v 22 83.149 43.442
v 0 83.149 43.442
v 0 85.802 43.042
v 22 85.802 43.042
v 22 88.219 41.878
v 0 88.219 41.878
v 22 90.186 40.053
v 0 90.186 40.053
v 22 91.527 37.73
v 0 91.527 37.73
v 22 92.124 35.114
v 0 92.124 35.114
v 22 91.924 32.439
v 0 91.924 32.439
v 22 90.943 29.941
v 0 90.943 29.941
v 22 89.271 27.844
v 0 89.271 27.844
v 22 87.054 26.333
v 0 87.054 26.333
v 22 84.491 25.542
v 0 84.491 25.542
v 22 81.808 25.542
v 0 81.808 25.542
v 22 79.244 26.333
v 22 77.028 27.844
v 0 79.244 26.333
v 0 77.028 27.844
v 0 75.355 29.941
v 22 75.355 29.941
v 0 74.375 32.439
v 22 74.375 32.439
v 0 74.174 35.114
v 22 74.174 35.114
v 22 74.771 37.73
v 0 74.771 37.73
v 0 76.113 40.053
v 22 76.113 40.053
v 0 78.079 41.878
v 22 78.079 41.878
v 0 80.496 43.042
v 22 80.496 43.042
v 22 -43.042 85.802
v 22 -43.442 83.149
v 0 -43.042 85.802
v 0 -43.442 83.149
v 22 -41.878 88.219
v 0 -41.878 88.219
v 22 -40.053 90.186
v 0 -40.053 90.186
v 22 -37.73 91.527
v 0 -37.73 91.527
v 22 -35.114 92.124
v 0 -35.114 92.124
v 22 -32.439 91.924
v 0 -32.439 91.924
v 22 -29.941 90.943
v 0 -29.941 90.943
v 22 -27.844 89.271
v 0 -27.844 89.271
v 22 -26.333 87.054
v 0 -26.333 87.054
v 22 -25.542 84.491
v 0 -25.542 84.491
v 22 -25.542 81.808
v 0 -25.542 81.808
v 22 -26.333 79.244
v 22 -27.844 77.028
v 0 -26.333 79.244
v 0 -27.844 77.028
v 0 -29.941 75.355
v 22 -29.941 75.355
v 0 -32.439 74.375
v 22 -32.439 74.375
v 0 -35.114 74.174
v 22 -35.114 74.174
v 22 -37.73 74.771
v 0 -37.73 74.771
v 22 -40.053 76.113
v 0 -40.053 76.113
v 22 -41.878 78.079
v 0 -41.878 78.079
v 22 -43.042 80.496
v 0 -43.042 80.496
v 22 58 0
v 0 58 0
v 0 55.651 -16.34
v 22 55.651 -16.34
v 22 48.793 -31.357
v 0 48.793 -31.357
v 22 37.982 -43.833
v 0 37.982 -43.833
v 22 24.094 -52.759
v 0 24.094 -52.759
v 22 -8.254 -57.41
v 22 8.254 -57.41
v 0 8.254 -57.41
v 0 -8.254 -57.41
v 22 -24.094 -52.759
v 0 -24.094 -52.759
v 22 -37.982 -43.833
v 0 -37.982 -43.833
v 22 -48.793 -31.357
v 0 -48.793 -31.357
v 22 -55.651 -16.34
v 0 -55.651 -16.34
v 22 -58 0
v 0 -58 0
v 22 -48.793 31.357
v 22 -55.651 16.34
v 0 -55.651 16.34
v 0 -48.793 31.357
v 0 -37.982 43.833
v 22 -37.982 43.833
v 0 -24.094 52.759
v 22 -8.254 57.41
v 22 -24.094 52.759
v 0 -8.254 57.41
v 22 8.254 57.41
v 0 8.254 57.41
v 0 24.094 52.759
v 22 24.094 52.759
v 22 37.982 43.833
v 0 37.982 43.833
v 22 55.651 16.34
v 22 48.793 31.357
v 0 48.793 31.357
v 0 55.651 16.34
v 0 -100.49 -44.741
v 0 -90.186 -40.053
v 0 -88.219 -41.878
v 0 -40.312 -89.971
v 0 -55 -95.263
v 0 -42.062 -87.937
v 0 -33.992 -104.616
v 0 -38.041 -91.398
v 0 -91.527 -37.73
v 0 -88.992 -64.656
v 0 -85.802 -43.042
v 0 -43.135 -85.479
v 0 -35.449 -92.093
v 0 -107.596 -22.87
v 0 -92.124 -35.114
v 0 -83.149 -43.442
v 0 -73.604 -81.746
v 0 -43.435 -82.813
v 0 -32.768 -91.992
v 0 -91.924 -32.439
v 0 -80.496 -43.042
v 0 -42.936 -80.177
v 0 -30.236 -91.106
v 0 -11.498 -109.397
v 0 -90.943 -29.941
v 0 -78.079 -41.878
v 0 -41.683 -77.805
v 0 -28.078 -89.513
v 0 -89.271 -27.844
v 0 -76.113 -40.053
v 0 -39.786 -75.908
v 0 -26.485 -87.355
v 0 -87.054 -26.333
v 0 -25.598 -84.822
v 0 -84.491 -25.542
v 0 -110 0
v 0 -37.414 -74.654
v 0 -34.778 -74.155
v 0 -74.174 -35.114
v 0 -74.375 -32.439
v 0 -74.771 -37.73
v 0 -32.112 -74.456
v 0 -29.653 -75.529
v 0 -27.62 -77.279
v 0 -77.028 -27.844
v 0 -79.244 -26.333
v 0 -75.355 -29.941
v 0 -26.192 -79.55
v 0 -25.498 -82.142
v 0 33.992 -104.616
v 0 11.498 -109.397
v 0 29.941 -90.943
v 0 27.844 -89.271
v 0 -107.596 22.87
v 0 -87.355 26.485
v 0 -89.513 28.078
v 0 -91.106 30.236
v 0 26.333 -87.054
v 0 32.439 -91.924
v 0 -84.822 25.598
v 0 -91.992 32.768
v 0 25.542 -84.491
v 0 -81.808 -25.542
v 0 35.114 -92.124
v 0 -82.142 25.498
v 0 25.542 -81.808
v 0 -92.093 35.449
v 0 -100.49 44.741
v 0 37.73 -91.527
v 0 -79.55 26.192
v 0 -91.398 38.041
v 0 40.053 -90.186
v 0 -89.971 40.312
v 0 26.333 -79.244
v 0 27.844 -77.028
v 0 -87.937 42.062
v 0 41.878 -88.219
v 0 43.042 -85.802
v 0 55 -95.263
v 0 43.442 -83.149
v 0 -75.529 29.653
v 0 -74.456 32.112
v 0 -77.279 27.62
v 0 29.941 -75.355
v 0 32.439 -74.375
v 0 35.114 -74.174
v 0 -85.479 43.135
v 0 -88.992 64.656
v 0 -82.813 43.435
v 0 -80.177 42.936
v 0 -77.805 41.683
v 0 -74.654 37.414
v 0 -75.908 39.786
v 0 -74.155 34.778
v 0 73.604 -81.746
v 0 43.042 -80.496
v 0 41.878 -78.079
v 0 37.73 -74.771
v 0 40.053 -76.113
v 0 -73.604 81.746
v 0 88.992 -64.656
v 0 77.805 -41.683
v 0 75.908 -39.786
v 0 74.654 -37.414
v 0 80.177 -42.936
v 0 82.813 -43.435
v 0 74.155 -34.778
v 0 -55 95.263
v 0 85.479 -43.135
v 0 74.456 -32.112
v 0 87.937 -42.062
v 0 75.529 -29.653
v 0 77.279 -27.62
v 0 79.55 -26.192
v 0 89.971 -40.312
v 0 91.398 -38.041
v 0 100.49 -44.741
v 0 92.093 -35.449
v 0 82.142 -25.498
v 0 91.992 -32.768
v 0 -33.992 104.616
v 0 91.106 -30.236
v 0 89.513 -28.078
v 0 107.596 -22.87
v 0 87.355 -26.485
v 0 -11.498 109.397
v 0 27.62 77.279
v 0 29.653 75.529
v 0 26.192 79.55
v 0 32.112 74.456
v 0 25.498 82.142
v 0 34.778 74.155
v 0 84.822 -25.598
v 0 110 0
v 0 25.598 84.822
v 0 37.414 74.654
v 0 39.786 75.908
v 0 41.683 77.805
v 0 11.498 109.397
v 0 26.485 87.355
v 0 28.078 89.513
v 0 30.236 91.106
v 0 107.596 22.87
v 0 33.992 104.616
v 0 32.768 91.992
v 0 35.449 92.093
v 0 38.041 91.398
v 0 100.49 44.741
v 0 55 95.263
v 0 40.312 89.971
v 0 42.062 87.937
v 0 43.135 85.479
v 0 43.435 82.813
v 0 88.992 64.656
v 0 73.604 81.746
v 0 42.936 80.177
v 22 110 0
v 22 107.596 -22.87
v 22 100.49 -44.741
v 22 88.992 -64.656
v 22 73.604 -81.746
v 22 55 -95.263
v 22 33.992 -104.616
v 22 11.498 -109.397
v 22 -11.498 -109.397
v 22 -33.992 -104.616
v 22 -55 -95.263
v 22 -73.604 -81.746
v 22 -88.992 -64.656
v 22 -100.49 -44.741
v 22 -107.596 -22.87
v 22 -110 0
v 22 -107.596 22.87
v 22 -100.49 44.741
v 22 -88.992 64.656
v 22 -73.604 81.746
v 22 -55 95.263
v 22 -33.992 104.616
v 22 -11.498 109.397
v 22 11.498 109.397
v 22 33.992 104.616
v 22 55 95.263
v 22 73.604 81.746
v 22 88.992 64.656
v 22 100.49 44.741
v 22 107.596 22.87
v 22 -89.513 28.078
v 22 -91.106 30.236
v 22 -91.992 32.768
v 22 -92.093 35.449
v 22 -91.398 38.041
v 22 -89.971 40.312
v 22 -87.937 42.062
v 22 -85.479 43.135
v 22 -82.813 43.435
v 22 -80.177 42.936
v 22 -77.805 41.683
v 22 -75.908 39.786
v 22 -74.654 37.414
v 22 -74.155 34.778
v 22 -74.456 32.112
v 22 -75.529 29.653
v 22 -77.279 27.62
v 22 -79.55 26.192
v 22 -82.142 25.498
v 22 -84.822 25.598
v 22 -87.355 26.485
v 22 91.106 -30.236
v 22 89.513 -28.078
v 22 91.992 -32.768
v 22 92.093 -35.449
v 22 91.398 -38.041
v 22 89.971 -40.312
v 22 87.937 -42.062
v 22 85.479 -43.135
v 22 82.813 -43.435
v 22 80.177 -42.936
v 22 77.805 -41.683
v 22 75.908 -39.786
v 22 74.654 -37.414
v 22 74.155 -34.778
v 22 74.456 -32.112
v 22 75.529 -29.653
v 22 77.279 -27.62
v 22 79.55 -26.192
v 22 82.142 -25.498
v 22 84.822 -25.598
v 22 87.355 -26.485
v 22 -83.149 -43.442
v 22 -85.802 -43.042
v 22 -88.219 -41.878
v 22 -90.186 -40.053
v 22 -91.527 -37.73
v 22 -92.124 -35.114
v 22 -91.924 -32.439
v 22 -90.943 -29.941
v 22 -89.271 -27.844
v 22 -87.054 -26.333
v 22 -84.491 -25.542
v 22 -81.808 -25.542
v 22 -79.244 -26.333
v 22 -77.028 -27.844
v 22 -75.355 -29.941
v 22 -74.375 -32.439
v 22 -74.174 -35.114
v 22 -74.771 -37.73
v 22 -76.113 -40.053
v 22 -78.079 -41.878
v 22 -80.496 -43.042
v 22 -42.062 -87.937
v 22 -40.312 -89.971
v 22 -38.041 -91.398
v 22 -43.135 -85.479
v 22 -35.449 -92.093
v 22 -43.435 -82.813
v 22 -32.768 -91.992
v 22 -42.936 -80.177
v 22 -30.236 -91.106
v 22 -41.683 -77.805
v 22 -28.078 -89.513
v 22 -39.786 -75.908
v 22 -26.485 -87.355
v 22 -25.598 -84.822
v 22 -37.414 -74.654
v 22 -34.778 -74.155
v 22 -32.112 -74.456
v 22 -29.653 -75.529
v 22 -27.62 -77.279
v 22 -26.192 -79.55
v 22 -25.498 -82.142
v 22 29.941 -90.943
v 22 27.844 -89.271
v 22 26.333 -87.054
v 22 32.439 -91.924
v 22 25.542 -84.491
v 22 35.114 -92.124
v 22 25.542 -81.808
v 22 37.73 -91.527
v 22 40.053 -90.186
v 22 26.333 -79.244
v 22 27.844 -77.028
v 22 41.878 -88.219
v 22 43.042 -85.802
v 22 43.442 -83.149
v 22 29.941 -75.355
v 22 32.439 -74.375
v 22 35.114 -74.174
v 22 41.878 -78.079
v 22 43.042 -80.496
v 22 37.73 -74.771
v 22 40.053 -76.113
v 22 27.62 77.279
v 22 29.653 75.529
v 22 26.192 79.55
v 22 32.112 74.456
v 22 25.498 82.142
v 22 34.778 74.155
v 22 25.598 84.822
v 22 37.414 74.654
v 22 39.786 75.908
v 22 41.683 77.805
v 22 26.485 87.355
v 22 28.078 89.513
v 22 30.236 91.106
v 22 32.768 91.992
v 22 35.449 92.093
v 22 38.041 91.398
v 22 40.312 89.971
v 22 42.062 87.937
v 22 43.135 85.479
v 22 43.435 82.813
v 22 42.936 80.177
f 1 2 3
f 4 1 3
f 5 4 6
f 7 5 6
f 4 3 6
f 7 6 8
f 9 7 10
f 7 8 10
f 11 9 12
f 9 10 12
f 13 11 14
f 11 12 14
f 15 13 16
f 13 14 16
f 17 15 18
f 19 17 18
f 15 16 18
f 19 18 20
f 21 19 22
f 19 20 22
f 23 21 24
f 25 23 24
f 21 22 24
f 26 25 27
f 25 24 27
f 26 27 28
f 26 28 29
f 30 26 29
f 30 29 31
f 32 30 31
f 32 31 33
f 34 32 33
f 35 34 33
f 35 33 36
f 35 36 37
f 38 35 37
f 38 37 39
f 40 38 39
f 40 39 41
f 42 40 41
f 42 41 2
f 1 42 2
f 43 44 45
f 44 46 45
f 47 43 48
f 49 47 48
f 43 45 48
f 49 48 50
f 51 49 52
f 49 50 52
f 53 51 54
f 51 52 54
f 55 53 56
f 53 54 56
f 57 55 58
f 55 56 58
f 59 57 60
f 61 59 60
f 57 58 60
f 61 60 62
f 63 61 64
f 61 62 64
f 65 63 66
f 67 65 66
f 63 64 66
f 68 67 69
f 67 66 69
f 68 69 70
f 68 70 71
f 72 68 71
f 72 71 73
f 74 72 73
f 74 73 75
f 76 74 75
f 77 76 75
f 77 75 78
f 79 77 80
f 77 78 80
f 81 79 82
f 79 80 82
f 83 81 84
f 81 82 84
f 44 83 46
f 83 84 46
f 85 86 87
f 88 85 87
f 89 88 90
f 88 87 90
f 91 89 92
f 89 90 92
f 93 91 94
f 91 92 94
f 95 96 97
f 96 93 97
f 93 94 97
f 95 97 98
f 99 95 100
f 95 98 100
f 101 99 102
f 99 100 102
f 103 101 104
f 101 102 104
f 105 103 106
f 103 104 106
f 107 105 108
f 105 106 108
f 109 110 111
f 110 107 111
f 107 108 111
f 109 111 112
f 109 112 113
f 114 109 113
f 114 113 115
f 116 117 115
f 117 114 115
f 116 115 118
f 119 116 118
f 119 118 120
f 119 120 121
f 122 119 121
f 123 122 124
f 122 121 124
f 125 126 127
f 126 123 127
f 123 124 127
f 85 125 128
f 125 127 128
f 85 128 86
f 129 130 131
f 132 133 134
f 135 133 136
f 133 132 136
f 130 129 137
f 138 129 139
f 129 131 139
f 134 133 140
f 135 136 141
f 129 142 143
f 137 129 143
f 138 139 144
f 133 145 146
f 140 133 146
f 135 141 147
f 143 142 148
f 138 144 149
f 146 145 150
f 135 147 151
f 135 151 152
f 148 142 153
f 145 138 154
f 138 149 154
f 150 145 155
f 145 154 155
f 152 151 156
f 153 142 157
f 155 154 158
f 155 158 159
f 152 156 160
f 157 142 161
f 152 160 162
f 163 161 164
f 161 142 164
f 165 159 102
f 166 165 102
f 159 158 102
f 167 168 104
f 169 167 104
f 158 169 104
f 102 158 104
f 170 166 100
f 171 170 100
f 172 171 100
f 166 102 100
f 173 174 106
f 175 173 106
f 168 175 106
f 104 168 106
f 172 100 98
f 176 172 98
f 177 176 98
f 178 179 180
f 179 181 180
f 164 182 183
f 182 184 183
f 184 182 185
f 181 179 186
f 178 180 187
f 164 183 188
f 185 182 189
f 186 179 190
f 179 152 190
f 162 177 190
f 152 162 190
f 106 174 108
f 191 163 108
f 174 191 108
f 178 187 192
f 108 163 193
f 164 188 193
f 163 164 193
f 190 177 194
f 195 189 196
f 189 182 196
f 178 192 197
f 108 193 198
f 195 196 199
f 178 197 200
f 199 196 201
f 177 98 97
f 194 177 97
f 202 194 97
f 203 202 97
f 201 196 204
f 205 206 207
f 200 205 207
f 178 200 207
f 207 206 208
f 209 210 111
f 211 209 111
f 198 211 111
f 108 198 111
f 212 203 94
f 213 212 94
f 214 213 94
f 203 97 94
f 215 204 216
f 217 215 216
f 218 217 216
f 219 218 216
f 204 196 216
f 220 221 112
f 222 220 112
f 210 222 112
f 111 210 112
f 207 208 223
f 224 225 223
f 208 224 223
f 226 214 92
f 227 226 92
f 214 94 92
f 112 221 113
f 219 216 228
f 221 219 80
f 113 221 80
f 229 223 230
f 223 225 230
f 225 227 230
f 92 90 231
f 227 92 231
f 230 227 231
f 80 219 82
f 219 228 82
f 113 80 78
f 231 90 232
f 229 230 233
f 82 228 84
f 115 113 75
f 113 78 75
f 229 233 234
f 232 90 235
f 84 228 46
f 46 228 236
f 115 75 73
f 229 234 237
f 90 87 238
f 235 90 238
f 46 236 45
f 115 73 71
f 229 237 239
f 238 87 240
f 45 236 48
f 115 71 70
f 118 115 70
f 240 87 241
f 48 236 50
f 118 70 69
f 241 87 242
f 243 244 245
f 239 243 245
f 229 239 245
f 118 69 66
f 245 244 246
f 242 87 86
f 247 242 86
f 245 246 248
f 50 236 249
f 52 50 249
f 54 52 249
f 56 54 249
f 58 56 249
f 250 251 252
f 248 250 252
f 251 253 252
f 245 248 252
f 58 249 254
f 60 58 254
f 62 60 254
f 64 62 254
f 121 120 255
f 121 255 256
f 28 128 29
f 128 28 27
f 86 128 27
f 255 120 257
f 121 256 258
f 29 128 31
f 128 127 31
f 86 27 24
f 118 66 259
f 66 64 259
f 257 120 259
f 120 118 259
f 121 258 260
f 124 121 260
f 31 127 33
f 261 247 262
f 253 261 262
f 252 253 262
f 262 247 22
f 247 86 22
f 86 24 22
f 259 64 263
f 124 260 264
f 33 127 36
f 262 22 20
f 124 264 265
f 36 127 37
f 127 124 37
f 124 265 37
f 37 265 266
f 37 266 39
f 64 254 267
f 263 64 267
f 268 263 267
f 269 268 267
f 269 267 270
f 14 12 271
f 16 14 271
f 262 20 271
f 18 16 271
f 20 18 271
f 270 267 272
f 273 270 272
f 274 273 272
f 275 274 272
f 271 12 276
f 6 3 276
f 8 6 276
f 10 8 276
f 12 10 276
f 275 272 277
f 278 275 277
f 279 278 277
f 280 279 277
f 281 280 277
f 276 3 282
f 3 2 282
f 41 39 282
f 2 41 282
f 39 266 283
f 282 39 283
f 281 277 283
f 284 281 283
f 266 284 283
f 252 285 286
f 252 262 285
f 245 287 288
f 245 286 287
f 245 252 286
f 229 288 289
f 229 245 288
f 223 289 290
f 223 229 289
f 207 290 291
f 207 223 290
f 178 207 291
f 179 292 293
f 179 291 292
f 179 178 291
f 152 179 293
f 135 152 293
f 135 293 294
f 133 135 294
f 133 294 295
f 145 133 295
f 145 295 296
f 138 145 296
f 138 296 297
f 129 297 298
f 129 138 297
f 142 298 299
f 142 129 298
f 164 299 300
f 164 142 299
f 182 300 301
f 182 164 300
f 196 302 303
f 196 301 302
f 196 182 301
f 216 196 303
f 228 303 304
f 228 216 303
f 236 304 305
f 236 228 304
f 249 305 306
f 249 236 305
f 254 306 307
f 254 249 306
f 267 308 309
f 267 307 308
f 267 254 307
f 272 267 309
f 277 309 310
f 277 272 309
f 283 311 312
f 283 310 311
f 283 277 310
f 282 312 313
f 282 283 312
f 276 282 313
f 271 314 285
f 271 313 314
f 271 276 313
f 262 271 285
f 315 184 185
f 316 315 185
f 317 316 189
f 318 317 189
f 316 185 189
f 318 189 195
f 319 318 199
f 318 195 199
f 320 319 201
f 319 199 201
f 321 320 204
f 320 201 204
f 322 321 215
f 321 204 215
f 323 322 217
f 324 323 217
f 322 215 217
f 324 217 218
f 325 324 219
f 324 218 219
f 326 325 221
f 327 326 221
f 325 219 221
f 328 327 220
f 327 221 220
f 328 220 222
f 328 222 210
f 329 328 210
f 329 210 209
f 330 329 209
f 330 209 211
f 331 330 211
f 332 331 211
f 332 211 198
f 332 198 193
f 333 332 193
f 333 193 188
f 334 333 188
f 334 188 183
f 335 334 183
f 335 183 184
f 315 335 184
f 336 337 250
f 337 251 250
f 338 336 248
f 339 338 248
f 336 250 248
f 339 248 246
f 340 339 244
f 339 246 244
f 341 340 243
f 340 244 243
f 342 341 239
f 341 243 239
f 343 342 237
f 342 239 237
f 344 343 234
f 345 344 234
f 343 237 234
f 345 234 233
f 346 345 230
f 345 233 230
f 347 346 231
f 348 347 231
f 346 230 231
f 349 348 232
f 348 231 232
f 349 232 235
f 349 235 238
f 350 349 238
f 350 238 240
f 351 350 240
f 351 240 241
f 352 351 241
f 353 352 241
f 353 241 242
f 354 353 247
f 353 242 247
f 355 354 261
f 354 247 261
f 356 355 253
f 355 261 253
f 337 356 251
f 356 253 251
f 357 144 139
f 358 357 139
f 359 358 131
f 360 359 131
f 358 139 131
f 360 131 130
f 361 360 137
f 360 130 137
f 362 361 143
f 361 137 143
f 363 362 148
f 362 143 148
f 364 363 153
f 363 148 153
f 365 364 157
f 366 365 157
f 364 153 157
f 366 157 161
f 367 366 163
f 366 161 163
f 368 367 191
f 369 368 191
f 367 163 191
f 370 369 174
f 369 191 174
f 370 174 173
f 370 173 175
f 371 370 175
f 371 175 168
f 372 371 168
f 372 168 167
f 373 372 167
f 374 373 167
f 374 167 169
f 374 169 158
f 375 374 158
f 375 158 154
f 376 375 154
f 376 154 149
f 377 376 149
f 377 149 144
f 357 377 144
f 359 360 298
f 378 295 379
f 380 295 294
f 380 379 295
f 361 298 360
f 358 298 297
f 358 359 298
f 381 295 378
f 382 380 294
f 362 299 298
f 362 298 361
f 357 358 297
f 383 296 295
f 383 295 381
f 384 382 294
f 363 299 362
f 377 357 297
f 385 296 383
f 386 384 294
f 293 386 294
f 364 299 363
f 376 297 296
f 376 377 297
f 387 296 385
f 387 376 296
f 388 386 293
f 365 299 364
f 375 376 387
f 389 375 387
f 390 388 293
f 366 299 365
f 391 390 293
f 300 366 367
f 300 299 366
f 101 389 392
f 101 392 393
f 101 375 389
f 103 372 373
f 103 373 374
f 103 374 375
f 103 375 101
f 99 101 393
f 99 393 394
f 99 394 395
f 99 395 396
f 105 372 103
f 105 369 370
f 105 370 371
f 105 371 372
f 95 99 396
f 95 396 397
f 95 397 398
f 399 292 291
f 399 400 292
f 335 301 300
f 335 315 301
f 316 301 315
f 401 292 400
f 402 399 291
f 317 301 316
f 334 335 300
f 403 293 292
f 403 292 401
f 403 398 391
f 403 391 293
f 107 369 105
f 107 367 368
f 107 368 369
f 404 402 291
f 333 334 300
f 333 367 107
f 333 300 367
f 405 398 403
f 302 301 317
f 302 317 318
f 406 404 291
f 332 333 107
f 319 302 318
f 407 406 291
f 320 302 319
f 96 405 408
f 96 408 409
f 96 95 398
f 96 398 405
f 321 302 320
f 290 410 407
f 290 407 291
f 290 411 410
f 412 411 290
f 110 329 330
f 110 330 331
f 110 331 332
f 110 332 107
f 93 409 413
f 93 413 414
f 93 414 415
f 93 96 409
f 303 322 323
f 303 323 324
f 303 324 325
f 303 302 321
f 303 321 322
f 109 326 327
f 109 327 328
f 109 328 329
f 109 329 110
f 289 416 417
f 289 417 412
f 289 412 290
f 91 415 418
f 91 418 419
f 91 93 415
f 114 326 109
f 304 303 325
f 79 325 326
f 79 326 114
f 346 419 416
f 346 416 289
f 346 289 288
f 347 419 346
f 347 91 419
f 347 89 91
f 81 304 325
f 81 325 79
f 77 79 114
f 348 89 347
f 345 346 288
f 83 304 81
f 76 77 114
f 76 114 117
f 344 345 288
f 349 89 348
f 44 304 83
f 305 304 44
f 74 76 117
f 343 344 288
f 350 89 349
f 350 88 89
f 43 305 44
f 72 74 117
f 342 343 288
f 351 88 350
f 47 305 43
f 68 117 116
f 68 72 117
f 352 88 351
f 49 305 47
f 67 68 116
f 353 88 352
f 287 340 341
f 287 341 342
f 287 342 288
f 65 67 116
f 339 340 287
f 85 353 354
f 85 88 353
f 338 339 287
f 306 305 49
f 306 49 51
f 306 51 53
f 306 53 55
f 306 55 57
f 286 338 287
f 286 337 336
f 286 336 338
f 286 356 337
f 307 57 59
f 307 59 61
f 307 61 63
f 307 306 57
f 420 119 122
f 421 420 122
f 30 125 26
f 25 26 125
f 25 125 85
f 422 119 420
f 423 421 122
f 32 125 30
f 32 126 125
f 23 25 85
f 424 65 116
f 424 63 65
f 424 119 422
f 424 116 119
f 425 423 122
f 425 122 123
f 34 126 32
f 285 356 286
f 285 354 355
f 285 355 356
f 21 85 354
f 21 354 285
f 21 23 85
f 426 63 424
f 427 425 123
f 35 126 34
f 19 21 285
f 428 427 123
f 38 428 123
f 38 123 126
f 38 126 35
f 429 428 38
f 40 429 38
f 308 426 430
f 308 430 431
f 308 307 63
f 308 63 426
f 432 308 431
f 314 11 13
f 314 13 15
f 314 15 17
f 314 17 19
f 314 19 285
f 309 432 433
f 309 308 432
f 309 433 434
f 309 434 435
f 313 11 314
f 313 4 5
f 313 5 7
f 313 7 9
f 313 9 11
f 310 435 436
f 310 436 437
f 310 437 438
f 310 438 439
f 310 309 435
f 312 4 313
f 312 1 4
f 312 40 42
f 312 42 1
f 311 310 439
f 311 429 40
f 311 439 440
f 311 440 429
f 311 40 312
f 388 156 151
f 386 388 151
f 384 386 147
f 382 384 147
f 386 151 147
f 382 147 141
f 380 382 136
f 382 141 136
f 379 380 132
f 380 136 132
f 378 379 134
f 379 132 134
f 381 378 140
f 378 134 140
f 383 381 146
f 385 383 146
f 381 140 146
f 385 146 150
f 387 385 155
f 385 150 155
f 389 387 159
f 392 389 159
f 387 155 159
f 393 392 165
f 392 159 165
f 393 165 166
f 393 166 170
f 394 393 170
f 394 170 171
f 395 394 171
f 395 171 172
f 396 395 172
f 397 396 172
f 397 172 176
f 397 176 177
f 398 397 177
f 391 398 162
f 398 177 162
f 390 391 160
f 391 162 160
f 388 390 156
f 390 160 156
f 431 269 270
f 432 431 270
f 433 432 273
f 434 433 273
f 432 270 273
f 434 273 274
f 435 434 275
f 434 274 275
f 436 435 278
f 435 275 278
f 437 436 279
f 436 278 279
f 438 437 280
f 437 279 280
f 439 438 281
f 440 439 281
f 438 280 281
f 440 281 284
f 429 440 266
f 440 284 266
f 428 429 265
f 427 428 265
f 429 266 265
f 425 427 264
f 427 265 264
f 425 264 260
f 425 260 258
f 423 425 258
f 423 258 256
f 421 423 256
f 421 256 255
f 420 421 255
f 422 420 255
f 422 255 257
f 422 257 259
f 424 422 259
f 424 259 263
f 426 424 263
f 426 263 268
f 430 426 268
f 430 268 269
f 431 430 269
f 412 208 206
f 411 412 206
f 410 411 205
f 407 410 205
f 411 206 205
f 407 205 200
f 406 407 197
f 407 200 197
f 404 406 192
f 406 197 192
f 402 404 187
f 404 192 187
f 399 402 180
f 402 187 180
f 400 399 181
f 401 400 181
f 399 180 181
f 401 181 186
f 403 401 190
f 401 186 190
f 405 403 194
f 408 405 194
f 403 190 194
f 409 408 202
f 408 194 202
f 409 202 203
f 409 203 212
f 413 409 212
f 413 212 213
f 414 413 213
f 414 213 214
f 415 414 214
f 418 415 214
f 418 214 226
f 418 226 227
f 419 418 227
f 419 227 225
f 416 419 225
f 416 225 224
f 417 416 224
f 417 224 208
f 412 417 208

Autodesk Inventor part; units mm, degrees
ref_plane "YZ Plane" through (0, 0, 0) normal (1, 0, 0) x (0, 1, 0)
ref_plane "XZ Plane" through (0, 0, 0) normal (0, 1, 0) x (-1, 0, 0)
ref_plane "XY Plane" through (0, 0, 0) normal (0, 0, 1) x (1, 0, 0)
sketch "Sketch1" plane through (0, 0, 0) normal (0, 0, 1) x (1, 0, 0)
  line L0 (22, 110) -> (0, 110)
  line L1 (0, 110) -> (0, 58)
  line L2 (0, 58) -> (0, 0) construction
  line L3 (0, 0) -> (22, 0) construction
  line L4 (22, 110) -> (22, 58)
  line L5 (22, 58) -> (0, 58)
  line L6 (22, 58) -> (22, 0) construction
  dimension "d0" = 220
  dimension "d1" = 22
  dimension "d6" = 116
revolve "Revolution1" add sketch "Sketch1" angle 360 about axis through (0, 0, 0) along (1, 0, 0)
sketch "Sketch2" plane through (0, 0, 0) normal (-1, 0, 0) x (0, 0, 1)
  circle A0 centre (0, 0) radius 58 projected
  circle A1 centre (0, 0) radius 90 construction
  line L0 (0, 90) -> (0, 0) construction
  circle A2 centre (0, 0) radius 110 projected
  circle A3 centre (34.4415, 83.1492) radius 9
  line L1 (0, 0) -> (34.4415, 83.1492) construction
  dimension "d2" = 180
  dimension "d7" = 18
  dimension "d8" = 22.5
extrude "Extrusion1" cut sketch "Sketch2" against normal through all contours A3
pattern_circular "Circular Pattern1" count 8 over 360 about axis through (11, 0, 0) along (1, 0, 0) of "Extrusion1"
equation "\"d0\" = D"
equation "\"d1\" = C1"
equation "\"d6\" = B1"
equation "\"d2\" = K1"
equation "\"d7\" = L"
equation "\"C1\" = 22"
equation "\"D\" = 220"
equation "\"K1\" = 180"
equation "\"L\" = 18"
equation "\"B1\" = 116"
equation "\"NB\" = 1.2345"
equation "\"Size_Designation\" = 1.2345"
properties part number "ISO 7005-1 Plate Flange for Welding Type 01 Flat Face - ISO PN 16 DN100" material "Steel"
